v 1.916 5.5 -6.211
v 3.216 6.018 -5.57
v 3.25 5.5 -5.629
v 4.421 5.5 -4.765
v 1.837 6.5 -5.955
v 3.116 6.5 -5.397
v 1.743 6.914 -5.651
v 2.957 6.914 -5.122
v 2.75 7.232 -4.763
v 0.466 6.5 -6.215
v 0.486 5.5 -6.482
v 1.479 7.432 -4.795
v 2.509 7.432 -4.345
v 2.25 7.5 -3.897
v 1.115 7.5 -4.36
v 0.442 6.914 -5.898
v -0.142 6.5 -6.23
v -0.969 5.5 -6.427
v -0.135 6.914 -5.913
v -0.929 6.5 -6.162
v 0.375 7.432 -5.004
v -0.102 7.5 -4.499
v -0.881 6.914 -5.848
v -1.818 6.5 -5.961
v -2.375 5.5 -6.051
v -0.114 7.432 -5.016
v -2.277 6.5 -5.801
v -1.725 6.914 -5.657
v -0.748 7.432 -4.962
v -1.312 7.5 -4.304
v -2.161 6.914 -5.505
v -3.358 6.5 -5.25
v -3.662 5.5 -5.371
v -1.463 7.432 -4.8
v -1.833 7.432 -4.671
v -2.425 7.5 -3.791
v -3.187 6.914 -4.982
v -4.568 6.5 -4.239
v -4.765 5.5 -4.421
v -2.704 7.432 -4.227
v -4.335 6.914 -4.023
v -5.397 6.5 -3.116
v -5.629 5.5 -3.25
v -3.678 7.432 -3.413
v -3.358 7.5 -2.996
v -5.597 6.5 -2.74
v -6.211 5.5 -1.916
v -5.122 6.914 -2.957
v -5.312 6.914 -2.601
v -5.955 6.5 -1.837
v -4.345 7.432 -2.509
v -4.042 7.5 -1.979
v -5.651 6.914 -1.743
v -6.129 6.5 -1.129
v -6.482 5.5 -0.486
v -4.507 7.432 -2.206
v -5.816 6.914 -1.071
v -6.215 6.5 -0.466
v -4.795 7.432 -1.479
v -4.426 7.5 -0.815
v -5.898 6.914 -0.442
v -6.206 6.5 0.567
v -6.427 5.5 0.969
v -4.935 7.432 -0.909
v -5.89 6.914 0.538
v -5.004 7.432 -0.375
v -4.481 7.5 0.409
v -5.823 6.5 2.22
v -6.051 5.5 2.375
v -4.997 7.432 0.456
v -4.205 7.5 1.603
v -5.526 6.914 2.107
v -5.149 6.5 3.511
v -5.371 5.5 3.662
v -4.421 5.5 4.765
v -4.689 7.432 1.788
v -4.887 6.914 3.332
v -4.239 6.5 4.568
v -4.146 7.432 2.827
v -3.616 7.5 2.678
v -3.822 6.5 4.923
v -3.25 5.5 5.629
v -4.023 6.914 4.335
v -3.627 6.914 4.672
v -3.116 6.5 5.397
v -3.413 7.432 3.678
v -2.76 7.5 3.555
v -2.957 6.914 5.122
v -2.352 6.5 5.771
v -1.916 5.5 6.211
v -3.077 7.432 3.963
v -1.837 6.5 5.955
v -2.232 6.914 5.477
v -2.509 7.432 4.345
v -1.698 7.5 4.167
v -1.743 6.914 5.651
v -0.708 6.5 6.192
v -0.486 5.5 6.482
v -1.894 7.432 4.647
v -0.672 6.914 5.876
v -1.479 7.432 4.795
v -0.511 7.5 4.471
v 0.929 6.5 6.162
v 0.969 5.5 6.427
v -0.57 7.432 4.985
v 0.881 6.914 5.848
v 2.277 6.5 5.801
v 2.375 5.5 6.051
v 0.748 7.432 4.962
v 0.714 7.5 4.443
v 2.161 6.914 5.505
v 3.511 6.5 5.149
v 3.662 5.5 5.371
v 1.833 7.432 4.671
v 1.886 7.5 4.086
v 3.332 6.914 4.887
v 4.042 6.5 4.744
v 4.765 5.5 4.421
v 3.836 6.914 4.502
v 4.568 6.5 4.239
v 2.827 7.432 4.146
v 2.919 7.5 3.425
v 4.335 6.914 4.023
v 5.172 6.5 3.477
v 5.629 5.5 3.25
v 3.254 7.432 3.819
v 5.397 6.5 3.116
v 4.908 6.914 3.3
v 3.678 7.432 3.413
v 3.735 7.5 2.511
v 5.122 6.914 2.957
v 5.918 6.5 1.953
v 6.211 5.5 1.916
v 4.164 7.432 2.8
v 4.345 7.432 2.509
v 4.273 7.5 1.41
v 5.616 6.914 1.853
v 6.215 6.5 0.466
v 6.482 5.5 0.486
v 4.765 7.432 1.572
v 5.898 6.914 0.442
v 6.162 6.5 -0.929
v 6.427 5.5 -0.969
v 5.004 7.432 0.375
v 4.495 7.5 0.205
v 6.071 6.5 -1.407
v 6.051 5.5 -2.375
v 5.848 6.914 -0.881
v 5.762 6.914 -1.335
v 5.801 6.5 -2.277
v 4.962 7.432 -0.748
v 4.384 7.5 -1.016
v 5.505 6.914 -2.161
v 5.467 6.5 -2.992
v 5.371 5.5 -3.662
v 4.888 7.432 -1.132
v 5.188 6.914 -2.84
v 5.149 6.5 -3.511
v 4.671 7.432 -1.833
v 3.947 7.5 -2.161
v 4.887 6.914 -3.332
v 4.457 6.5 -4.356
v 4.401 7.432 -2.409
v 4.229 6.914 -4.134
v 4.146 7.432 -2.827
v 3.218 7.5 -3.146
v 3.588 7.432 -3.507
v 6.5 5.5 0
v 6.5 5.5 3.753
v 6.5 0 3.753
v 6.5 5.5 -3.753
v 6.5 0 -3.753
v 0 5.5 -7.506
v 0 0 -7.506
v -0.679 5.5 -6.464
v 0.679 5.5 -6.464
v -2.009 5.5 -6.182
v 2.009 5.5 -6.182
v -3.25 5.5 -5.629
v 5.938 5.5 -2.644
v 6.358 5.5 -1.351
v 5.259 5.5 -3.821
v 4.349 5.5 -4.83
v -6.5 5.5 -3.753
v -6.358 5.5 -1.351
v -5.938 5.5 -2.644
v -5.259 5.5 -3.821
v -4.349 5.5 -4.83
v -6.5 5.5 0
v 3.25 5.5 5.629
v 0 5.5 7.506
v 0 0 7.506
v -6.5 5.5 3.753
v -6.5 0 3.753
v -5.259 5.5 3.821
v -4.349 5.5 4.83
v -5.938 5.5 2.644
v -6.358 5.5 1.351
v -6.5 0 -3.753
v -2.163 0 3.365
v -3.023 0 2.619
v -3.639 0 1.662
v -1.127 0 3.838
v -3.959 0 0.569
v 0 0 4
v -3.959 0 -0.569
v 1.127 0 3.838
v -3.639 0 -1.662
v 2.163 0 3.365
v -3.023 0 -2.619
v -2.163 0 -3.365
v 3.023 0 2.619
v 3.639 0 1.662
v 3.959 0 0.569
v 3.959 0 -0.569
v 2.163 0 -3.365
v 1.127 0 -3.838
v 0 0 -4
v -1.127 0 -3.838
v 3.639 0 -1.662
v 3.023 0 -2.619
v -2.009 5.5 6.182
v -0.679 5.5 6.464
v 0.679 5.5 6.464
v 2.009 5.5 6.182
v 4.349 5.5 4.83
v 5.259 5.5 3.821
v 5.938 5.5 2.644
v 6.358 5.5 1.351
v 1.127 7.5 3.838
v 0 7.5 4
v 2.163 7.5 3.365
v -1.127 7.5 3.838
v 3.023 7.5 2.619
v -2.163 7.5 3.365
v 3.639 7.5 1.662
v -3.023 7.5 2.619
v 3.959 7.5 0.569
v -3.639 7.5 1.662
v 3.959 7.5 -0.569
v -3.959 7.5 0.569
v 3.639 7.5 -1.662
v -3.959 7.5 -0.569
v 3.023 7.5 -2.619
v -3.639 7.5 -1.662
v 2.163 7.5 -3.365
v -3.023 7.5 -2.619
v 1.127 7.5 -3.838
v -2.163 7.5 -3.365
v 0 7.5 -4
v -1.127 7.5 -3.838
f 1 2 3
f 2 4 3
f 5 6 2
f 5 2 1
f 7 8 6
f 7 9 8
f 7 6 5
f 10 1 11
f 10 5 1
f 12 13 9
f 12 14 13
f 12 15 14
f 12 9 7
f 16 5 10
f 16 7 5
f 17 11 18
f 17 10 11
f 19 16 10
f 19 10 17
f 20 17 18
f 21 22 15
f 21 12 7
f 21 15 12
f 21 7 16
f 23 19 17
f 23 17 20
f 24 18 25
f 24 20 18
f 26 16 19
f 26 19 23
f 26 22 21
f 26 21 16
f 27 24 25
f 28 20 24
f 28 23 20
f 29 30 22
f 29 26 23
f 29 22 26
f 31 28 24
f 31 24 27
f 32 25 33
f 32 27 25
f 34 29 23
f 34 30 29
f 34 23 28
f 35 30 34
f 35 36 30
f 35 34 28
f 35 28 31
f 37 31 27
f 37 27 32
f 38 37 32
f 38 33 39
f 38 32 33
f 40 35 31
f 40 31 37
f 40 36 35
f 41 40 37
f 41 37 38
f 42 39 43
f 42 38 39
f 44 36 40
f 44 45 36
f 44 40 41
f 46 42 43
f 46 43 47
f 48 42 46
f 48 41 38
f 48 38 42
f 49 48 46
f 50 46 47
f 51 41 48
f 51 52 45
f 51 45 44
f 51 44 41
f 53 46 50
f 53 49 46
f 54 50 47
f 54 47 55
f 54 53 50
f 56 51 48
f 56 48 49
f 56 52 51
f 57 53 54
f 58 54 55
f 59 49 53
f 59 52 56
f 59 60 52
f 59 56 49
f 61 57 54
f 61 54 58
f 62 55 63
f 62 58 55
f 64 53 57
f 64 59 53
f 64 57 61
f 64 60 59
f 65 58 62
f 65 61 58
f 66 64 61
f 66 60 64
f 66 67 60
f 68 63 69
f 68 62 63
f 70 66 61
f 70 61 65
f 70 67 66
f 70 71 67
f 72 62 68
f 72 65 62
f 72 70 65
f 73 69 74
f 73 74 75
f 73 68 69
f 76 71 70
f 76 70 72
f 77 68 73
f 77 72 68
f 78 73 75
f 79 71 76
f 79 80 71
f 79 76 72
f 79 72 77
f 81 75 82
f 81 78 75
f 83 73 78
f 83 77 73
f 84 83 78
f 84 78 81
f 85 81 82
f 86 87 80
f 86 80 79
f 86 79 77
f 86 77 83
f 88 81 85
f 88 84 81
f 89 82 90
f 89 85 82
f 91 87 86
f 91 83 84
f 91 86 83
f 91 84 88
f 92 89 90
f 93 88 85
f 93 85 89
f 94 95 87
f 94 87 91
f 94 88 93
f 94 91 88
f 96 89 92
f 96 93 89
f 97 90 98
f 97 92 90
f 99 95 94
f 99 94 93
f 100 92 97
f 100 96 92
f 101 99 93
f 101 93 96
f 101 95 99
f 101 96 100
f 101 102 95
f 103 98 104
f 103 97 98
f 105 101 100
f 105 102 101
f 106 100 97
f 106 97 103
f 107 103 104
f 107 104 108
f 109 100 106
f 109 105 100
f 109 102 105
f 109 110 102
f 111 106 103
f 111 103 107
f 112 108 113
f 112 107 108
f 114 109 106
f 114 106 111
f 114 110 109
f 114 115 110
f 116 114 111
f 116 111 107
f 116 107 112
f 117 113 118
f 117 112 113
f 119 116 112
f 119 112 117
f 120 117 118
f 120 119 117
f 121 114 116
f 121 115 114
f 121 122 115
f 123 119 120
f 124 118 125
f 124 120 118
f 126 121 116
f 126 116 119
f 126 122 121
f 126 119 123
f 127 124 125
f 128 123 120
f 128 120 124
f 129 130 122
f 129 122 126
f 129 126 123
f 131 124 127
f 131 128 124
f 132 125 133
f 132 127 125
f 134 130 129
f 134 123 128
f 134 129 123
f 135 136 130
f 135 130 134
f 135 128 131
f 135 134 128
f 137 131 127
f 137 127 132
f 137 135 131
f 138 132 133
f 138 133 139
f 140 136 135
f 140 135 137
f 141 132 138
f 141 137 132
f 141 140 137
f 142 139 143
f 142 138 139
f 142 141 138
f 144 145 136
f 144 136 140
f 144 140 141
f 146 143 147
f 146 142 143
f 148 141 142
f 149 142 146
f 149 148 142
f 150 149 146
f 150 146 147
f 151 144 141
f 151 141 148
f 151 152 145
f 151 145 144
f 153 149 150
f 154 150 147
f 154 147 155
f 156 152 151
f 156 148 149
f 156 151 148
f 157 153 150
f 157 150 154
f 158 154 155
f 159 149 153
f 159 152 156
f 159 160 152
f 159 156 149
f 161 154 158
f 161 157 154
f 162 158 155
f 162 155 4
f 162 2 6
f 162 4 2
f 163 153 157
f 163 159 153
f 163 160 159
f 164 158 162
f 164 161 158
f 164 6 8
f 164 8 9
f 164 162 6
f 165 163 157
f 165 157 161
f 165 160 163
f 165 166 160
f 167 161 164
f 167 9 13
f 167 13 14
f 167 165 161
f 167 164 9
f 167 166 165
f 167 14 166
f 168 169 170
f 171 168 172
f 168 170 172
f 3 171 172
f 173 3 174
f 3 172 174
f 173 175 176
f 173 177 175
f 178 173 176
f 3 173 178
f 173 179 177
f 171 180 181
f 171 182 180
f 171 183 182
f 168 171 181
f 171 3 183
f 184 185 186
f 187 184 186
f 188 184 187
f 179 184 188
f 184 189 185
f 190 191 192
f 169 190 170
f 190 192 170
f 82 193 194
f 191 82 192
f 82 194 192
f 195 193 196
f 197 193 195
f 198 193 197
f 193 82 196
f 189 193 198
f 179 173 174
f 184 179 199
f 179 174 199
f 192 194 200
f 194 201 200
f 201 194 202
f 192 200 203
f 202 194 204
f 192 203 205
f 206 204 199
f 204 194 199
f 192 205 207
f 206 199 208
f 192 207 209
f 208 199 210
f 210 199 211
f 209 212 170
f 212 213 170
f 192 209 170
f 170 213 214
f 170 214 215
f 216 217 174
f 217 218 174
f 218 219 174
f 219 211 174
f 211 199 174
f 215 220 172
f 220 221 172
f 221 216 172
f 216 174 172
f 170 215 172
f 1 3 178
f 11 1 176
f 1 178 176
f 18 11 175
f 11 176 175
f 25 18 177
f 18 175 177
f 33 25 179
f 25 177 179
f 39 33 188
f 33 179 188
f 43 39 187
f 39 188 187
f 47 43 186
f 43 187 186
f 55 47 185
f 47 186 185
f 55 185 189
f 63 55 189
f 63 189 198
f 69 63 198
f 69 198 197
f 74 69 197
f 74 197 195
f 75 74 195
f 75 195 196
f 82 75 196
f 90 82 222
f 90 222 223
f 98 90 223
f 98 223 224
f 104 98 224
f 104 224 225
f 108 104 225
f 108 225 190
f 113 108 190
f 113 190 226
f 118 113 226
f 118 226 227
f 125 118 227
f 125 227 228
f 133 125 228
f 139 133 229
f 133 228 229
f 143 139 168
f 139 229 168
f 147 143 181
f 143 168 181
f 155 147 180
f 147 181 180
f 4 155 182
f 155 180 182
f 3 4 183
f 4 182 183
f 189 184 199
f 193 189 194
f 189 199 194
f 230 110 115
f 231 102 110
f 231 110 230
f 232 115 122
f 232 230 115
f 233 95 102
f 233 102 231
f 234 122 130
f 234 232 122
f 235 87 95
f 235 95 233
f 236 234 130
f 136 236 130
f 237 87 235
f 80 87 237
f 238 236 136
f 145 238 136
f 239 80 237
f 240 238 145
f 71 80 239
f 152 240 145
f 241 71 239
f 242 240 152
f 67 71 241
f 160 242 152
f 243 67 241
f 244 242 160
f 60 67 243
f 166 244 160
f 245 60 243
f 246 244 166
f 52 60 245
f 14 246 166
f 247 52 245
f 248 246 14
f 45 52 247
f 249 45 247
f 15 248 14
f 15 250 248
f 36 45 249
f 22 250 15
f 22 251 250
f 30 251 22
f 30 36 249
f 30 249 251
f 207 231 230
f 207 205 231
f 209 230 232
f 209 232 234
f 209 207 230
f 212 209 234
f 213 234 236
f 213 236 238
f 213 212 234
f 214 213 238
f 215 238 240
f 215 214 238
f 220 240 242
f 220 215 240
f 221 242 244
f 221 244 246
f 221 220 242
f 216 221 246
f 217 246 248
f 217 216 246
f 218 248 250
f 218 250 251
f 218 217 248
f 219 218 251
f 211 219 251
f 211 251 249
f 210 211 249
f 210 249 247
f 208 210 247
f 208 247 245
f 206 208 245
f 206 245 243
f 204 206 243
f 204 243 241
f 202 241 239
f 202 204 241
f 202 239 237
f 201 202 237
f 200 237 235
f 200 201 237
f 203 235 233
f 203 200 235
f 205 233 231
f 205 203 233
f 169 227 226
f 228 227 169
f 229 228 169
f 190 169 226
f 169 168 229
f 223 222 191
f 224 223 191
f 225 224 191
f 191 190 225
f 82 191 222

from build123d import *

# Parameters (mm, degrees)
SKETCH1_R           = 4
BOSS_EXTRUDE1_DEPTH = 5.5
SKETCH2_R           = 6.5
SKETCH2_R_2         = 4
BOSS_EXTRUDE2_DEPTH = 2
FILLET1_R           = 2


with BuildPart() as part:
    # Sketch1 → Boss-Extrude1 (new body)
    with BuildSketch(Plane(origin=(0, 0, 0), x_dir=(1, 0, 0), z_dir=(0, 1, 0))):
        Polygon((6.5, -3.75277675), (6.5, 3.75277675), (0, 7.505553499), (-6.5, 3.75277675), (-6.5, -3.75277675), (0, -7.505553499), align=None)
        with Locations(Location((0, 0, 0), (0, 0, 270))):
            Circle(SKETCH1_R, mode=Mode.SUBTRACT)
    extrude(amount=BOSS_EXTRUDE1_DEPTH)

    # Sketch2 → Boss-Extrude2 (add)
    with BuildSketch(Plane(origin=(0, 5.5, 0), x_dir=(1, 0, 0), z_dir=(0, 1, 0))):
        with Locations(Location((0, 0, 0), (0, 0, 60))):
            Circle(SKETCH2_R)
        with Locations(Location((0, 0, 0), (0, 0, 270))):
            Circle(SKETCH2_R_2, mode=Mode.SUBTRACT)
    extrude(amount=BOSS_EXTRUDE2_DEPTH)

    # Fillet1
    fillet1_edges = [part.edges().sort_by_distance(p)[0] for p in [
        (-3.25, 7.5, 5.629165125),
    ]]
    fillet(fillet1_edges, radius=FILLET1_R - 0.0001)  # a hair under: the kernel refuses the full size


solid = part.part
